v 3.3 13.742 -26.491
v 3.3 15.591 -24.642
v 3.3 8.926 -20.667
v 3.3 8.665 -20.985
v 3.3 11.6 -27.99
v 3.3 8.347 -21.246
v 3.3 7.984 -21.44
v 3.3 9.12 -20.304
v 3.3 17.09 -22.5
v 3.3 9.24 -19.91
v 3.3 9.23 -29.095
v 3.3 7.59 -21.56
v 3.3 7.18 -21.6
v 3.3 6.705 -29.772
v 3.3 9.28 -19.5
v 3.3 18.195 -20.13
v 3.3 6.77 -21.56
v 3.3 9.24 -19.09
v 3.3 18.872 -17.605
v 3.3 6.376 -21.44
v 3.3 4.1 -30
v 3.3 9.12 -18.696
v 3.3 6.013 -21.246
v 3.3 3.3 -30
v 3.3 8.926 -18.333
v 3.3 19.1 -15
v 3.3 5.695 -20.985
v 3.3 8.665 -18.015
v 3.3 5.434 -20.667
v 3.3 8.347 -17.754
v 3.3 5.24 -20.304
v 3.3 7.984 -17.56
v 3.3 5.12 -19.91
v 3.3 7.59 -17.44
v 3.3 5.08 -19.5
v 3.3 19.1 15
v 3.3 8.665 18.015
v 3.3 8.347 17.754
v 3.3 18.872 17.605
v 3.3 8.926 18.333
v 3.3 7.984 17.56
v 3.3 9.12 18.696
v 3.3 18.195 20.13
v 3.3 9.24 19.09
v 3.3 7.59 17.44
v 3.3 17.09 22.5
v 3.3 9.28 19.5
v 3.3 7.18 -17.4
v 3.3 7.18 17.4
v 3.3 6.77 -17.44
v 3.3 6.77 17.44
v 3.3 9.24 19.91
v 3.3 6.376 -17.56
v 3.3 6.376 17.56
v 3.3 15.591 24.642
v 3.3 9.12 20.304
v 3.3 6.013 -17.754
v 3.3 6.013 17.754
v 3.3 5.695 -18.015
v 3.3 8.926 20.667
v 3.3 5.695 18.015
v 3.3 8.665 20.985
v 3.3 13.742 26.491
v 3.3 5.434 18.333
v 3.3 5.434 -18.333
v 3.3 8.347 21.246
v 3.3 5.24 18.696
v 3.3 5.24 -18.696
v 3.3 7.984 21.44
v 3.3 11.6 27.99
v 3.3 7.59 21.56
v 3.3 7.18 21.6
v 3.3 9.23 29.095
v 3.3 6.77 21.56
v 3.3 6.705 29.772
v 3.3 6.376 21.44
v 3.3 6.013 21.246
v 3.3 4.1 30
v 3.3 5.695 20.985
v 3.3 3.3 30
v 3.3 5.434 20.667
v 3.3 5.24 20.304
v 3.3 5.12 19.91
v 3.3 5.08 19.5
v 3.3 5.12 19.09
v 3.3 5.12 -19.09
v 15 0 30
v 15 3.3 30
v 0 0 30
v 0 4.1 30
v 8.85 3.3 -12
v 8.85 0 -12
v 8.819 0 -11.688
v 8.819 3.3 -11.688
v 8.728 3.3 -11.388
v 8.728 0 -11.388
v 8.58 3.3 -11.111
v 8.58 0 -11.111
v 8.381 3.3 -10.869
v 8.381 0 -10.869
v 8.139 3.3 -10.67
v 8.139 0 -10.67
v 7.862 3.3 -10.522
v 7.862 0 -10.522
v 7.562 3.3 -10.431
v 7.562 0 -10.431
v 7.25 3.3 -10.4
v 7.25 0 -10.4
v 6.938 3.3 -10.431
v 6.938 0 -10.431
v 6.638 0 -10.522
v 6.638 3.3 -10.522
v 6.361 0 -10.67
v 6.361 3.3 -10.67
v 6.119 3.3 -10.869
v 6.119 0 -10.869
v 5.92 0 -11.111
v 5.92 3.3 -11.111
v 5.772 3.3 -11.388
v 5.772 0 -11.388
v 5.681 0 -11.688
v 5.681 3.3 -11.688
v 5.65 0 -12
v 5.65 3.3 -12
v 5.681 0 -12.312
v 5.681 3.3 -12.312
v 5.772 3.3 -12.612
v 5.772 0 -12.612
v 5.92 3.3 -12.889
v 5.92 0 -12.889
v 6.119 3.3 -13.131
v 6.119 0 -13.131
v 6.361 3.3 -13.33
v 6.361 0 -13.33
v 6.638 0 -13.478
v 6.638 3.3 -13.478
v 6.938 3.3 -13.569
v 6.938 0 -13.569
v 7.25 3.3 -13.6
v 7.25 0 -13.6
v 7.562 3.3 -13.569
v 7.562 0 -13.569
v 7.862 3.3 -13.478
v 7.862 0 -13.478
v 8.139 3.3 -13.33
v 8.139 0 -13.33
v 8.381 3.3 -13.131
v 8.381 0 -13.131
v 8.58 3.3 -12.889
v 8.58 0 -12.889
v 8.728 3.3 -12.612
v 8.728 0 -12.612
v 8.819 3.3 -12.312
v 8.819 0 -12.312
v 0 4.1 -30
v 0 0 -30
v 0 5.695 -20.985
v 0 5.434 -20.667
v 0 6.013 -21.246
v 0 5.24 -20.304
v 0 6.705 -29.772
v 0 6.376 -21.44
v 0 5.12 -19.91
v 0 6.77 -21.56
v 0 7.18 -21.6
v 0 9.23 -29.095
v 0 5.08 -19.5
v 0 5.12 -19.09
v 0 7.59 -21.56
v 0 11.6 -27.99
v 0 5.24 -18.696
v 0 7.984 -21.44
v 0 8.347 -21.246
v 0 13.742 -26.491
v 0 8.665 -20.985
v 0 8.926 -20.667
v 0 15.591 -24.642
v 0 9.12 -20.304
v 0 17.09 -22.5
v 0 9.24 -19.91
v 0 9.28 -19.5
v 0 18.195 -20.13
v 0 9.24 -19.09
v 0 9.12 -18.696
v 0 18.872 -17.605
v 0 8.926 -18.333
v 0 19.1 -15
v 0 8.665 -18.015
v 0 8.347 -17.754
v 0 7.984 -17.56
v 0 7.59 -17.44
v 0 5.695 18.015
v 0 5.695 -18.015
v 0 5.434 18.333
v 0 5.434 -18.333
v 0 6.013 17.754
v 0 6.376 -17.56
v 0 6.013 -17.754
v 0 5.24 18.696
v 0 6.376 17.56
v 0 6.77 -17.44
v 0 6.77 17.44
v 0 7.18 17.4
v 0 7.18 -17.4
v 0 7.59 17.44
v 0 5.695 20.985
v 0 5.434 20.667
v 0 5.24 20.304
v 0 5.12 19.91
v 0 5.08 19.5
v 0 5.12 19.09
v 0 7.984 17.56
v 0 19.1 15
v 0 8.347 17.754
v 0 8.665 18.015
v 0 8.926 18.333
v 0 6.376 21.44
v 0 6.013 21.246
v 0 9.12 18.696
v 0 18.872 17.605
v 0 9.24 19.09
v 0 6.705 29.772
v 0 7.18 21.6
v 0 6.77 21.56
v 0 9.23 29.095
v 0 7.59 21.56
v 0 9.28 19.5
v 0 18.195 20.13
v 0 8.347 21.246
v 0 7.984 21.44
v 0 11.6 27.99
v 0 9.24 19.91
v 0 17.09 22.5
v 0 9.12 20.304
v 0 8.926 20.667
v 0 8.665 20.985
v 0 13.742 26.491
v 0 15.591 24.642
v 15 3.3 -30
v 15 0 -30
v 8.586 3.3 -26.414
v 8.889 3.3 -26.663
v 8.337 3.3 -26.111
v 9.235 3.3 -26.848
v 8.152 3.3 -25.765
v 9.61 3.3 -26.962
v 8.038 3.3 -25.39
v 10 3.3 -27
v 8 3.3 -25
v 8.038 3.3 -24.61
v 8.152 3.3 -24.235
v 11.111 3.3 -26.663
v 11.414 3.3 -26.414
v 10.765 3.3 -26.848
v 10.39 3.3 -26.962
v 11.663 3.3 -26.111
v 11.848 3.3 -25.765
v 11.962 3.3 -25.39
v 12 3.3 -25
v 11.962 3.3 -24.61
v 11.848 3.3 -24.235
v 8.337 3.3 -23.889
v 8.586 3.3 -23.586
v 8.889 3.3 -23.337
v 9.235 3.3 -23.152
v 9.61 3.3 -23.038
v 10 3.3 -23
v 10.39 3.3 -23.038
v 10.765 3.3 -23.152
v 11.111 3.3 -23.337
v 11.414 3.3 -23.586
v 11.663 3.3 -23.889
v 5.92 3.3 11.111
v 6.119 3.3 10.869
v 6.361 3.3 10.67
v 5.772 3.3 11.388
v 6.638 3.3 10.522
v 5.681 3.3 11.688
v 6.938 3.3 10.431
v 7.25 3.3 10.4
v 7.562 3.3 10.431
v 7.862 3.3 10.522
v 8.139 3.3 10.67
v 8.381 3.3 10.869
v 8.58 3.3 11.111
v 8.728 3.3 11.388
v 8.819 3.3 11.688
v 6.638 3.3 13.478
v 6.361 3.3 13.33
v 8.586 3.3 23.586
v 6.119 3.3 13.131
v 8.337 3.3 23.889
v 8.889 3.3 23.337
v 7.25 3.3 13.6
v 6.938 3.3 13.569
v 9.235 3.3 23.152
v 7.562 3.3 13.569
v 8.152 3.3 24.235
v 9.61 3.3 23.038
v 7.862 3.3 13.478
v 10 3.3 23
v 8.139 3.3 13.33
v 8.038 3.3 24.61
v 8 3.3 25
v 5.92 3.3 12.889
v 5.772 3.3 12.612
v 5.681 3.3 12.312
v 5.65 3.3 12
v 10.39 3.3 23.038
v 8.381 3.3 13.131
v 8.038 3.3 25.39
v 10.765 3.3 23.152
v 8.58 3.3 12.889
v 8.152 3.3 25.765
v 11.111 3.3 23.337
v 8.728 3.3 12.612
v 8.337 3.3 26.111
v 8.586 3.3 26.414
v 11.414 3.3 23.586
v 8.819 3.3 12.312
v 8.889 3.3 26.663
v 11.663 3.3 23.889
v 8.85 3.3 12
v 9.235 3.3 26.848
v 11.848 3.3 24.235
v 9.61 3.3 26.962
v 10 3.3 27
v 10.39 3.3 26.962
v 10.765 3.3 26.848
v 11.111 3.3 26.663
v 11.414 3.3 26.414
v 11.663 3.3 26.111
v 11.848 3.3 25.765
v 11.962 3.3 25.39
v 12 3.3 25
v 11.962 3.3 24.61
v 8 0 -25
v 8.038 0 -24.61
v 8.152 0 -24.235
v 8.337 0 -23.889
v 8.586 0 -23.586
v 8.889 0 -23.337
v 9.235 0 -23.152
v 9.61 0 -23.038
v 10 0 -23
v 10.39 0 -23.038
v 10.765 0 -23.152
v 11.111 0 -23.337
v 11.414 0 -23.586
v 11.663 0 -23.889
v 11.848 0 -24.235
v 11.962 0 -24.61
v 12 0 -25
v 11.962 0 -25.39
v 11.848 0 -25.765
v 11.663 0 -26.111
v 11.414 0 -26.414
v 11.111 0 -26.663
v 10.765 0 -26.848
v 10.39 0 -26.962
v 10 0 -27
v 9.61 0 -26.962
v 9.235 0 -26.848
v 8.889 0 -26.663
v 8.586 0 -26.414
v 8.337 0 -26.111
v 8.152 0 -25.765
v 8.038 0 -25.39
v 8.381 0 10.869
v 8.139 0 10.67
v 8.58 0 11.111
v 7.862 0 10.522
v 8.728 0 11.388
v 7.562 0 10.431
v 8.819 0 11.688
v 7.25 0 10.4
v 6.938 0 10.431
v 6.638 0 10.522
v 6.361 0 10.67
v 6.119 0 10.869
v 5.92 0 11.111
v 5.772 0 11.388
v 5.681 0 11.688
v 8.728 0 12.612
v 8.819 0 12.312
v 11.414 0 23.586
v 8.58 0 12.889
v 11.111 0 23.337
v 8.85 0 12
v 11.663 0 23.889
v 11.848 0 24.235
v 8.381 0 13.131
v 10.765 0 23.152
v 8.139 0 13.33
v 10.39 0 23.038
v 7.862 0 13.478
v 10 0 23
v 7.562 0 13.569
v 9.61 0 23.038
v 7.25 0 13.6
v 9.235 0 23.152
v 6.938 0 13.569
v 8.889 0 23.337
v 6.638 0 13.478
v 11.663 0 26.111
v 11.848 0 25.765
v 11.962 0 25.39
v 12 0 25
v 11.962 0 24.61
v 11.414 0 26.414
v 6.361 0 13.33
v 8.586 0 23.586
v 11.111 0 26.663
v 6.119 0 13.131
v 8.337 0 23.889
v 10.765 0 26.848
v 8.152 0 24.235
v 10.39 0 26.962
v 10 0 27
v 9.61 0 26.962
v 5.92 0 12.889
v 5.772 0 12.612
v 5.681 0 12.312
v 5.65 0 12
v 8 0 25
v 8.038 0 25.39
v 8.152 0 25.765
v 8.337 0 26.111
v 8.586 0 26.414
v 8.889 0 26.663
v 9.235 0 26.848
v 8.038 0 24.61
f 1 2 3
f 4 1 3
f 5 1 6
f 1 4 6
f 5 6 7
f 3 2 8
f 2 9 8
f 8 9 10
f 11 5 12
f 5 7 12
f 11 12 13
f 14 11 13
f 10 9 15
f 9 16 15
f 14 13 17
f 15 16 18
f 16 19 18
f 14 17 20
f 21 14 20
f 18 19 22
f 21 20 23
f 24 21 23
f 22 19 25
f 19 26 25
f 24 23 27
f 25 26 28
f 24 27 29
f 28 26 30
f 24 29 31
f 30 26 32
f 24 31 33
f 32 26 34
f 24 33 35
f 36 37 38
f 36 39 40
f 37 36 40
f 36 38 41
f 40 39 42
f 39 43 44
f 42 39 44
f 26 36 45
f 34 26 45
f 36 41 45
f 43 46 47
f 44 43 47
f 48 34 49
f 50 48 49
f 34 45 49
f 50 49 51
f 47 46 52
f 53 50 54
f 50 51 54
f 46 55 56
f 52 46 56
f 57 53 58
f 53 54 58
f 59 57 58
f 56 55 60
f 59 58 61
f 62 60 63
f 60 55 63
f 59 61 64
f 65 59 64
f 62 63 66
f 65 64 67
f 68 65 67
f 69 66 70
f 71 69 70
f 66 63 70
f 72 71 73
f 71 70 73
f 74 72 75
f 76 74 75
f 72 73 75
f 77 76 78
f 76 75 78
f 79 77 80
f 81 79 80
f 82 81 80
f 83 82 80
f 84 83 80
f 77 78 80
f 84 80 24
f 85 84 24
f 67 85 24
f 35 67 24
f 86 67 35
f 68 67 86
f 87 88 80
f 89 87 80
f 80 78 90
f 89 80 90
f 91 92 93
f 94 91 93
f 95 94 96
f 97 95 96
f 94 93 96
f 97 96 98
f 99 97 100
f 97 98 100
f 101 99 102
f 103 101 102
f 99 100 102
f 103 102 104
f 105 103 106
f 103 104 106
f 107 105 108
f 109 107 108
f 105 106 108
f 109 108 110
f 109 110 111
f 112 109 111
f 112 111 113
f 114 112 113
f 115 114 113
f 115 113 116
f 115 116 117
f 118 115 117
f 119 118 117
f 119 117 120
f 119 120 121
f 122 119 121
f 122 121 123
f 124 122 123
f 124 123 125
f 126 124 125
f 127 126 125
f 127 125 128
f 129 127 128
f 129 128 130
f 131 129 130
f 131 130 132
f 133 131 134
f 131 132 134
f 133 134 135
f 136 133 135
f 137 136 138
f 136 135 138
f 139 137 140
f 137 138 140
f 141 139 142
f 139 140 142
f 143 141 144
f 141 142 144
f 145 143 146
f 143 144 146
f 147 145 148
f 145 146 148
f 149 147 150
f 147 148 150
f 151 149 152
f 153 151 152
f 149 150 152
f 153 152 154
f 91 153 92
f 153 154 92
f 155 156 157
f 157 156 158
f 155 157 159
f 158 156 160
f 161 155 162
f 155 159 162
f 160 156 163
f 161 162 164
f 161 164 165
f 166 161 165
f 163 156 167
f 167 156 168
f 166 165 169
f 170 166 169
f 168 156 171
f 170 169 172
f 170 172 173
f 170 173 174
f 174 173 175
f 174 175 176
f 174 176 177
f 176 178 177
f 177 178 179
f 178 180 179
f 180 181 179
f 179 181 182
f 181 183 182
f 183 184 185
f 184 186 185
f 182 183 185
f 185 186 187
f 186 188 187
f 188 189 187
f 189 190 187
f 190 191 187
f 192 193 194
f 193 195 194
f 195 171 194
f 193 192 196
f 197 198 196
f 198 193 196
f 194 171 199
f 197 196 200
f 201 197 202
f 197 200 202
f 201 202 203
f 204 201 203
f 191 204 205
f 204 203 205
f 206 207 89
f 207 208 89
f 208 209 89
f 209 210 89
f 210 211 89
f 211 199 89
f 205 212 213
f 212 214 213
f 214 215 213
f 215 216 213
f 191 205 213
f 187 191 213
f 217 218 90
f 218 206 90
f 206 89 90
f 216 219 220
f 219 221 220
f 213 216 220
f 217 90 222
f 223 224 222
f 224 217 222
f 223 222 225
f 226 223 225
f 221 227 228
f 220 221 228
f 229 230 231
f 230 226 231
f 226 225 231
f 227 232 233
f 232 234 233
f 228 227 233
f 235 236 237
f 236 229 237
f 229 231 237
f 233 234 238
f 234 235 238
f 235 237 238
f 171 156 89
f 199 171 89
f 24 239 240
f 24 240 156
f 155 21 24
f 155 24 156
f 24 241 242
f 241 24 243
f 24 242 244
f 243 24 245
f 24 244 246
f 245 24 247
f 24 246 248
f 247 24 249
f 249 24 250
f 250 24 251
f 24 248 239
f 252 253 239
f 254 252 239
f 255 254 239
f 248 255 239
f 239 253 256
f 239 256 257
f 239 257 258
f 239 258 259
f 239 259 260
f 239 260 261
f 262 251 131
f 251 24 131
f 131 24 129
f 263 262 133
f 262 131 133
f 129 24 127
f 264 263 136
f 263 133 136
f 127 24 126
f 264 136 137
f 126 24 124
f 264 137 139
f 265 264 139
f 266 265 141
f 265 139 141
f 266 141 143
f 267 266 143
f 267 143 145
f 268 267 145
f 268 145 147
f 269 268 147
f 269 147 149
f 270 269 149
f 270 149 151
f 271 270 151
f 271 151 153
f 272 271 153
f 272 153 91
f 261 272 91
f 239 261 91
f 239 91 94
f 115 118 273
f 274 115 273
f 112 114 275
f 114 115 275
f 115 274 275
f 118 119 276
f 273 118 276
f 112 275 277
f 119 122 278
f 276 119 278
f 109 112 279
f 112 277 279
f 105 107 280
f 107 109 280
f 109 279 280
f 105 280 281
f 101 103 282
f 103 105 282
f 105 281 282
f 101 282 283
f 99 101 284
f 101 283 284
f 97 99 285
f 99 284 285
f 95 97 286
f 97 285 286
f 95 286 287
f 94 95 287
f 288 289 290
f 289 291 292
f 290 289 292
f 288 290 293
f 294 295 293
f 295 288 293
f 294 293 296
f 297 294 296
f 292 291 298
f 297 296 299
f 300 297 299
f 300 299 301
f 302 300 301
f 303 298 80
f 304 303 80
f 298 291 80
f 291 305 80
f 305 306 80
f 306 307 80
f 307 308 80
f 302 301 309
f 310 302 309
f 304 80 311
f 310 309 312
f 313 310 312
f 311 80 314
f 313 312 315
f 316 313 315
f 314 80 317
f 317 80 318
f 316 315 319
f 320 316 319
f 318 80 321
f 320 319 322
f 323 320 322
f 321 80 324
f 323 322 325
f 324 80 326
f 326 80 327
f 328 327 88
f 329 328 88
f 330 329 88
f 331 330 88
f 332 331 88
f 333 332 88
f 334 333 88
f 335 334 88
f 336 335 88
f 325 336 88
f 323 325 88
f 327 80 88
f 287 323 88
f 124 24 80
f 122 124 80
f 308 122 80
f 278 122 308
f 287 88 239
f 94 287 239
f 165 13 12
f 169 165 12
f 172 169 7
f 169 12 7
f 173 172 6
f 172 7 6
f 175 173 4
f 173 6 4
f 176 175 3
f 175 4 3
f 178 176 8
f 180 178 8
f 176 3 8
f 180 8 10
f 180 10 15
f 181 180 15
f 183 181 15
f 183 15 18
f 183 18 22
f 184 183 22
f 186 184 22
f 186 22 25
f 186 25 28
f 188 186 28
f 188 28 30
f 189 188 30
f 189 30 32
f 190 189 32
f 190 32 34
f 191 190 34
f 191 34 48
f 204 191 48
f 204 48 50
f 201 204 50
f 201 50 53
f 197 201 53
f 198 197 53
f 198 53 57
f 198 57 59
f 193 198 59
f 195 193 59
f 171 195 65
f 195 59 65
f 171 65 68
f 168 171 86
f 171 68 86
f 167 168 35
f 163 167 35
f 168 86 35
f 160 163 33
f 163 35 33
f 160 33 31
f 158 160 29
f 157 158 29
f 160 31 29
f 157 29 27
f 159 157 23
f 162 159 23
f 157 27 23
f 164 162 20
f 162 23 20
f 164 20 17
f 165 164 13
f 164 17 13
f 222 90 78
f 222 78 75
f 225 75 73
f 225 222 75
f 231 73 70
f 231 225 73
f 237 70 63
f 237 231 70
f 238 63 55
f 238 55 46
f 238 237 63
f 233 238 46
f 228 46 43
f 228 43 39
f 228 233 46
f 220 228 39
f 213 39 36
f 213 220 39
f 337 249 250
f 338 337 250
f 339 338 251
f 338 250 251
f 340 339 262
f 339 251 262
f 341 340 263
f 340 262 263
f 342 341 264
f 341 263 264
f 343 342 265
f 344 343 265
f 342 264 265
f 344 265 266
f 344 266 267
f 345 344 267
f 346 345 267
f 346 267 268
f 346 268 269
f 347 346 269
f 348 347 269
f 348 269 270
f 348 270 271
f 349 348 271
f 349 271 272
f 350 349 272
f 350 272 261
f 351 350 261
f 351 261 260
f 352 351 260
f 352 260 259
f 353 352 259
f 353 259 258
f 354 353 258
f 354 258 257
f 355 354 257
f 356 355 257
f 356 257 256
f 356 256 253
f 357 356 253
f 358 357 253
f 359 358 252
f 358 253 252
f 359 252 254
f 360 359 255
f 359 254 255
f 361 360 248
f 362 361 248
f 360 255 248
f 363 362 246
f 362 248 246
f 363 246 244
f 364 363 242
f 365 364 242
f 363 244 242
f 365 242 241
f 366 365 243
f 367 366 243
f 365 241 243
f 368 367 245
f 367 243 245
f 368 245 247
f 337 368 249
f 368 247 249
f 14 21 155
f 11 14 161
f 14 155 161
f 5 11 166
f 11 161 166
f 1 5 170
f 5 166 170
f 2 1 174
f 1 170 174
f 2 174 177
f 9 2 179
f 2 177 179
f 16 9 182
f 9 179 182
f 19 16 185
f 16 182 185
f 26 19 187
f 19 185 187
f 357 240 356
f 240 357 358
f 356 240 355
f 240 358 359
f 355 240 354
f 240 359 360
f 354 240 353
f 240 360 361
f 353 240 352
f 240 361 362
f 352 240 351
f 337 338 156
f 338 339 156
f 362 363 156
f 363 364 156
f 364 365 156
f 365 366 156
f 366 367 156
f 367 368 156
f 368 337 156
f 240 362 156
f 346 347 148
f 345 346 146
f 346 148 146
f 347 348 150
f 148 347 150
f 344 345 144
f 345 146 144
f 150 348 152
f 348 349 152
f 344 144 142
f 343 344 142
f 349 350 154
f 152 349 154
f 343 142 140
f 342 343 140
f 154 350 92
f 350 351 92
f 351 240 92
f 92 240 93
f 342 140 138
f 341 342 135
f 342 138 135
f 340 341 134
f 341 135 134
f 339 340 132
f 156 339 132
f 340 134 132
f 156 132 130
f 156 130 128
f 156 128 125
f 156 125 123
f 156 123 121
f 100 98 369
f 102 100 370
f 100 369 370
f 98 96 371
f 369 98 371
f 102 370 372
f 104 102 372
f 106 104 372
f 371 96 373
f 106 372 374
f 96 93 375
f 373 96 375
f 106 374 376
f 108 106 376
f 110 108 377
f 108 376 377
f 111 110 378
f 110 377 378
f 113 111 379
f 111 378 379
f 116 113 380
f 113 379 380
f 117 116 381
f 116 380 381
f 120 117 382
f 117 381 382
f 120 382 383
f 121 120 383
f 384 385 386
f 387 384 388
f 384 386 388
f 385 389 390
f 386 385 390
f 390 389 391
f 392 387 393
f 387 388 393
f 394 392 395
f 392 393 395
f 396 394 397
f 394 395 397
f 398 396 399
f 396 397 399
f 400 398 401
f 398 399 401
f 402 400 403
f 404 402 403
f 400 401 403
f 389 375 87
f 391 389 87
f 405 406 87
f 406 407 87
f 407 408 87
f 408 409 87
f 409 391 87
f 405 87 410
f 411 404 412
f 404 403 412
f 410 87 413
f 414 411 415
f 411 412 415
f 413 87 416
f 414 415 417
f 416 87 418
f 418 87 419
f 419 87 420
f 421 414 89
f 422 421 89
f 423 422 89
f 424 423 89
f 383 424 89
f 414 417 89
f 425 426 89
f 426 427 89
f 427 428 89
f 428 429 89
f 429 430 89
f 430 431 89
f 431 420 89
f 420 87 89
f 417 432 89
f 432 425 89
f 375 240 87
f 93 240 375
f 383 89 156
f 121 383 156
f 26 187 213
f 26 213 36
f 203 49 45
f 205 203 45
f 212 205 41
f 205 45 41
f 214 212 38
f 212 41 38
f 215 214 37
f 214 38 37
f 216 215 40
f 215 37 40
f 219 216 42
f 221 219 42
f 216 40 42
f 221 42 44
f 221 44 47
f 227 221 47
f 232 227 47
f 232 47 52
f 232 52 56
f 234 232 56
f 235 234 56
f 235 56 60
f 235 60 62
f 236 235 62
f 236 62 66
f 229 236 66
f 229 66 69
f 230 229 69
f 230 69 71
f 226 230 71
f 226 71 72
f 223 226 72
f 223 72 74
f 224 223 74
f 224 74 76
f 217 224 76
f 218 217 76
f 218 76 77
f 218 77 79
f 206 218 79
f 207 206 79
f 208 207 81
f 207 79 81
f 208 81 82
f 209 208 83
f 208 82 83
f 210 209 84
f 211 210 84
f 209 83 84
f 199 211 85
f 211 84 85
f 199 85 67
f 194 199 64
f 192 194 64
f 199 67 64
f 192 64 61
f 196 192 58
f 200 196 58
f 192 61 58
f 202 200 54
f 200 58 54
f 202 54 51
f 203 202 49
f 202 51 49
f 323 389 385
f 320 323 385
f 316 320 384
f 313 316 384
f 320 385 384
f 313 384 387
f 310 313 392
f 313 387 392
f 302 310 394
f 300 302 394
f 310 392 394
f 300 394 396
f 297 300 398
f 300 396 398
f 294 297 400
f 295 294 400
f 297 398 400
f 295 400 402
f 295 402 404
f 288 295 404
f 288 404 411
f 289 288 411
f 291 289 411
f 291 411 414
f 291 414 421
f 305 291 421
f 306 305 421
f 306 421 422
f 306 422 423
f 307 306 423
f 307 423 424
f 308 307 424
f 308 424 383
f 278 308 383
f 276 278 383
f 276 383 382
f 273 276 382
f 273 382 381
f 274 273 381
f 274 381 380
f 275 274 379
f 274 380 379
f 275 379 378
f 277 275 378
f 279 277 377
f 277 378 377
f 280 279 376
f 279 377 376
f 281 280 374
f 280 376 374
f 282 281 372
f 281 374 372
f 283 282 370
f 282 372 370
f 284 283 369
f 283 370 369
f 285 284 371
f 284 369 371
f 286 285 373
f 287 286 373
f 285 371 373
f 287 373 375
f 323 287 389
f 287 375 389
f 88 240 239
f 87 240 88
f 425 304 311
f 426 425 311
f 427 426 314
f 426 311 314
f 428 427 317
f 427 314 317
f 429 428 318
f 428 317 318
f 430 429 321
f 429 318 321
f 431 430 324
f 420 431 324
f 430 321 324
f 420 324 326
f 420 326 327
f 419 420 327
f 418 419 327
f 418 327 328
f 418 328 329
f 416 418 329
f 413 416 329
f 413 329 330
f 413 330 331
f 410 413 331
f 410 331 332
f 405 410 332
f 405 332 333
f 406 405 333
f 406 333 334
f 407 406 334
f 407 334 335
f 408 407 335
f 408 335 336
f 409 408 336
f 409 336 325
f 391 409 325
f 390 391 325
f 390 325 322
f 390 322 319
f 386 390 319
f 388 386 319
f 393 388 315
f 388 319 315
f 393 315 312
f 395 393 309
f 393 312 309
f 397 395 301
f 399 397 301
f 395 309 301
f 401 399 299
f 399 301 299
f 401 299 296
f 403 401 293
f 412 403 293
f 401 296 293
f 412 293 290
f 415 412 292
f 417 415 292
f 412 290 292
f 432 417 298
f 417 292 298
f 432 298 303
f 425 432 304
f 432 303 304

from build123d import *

# Parameters (mm, degrees)
EXTRUDE1_DEPTH               = 30
SKETCH2_W                    = 4.1
SKETCH2_H                    = 60
CUT_FOR_WALKER_CHASSIS_DEPTH = 41.368552117
F_4_2_4_2_DIAMETER_HOLE1_D   = 4.2
M4X0_7_TAPPED_HOLE1_D        = 4
SKETCH7_R                    = 1.6
CUT_EXTRUDE1_DEPTH           = 39.598056946
CUT_EXTRUDE_2_DEPTH          = 10


with BuildPart() as part:
    # Sketch1 → Extrude1 (new, symmetric)
    with BuildSketch(Plane.XY):
        Polygon((0, 0), (0, 19.1), (3.3, 19.1), (3.3, 3.3), (19.1, 3.3), (19.1, 0), align=None)
    extrude(amount=EXTRUDE1_DEPTH, both=True)

    # Sketch2 → Cut for walker chassis (cut, through all)
    with BuildSketch(Plane.XZ):
        with Locations((17.05, 0)):
            Rectangle(SKETCH2_W, SKETCH2_H)
    extrude(amount=-CUT_FOR_WALKER_CHASSIS_DEPTH, mode=Mode.SUBTRACT)

    # Ø4.2 (4.2) Diameter Hole1 (through all)
    with Locations(Plane.ZY):
        with Locations((-19.5, 7.18), (19.5, 7.18)):
            Hole(F_4_2_4_2_DIAMETER_HOLE1_D / 2)

    # M4x0.7 Tapped Hole1 (through all)
    with Locations(Plane.XZ):
        with Locations((10, 25), (10, -25)):
            Hole(M4X0_7_TAPPED_HOLE1_D / 2)

    # Sketch7 → Cut-Extrude1 (cut, through all)
    with BuildSketch(Plane.XZ):
        with Locations((7.25, -12)):
            Circle(SKETCH7_R)
        with Locations((7.25, 12)):
            Circle(SKETCH7_R)
    extrude(amount=-CUT_EXTRUDE1_DEPTH, mode=Mode.SUBTRACT)

    # Эскиз3 → Вырез-Вытянуть2 (cut)
    with BuildSketch(Plane(origin=(0, 0, 0), x_dir=(0, 0, -1), z_dir=(1, 0, 0))):
        with BuildLine():
            Line((-30, 19.1), (-30, 4.1))
            ThreePointArc((-30, 4.1), (-25.606601718, 14.706601718), (-15, 19.1))
            Line((-15, 19.1), (-30, 19.1))
        make_face()
    cut_extrude_2 = extrude(amount=CUT_EXTRUDE_2_DEPTH, mode=Mode.SUBTRACT)

    # Зеркальное отражение1: Вырез-Вытянуть2 across plane
    add(cut_extrude_2.mirror(Plane.XY), mode=Mode.SUBTRACT)


solid = part.part
